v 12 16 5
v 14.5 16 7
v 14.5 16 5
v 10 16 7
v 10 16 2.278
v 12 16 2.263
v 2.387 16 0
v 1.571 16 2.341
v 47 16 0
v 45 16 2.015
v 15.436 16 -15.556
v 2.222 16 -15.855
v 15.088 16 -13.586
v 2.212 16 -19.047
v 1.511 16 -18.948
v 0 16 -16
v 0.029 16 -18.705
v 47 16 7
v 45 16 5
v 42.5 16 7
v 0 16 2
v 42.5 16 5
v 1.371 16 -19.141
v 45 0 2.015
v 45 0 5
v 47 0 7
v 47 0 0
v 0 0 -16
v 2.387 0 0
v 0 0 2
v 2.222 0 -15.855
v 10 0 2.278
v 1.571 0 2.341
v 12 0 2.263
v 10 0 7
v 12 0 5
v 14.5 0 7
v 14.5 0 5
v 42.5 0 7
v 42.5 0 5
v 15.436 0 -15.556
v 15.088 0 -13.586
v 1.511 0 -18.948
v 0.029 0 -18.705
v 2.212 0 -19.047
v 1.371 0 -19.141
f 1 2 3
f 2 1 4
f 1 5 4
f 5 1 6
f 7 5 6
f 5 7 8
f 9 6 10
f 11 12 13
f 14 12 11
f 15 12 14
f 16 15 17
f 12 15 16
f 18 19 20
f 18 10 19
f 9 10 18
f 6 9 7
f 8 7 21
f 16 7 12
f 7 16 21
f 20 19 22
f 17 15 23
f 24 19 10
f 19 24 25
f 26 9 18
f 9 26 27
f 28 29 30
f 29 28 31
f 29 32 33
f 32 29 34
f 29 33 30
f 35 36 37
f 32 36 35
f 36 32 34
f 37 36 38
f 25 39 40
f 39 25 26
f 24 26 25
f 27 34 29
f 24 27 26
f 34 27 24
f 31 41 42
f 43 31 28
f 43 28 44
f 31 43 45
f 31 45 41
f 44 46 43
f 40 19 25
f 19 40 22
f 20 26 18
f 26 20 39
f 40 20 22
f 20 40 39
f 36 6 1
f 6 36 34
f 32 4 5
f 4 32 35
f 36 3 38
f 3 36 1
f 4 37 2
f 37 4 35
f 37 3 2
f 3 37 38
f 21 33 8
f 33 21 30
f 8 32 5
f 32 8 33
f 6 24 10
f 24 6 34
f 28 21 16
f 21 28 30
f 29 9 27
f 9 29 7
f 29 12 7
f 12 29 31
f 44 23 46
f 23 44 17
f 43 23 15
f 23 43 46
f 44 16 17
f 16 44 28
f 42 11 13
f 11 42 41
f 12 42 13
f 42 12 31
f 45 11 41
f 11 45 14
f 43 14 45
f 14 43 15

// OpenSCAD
// Klemmträger
module long_arm() {
 hull() {
linear_extrude(height=2)
square([47, 16]);
     translate([1.2,16,1.2])
    rotate([90,0,0]) 
cylinder(r1=1.2, r2=1.2, h=16);
 }
}
module short_arm() {
hull() {
translate([1.2,16,1.2])
rotate([90,0,0]) 
cylinder(r1=1.2, r2=1.2, h=16);
rotate([0,90,0])
linear_extrude(height=2)
square([16, 16]);
rotate([90,0,0])
    translate([1,-18,-16])
cylinder(r1=1.2, r2=1.2, h=16);    
}
}

module claw() {
hull() {
rotate([90,0,0])
    translate([1,-18,-16])
cylinder(r1=1.2, r2=1.2, h=16);
rotate([0,180,0])
translate([-15,0,16])
linear_extrude(height=2)
square([15, 16]);
}
}

module rail() {
cube([16,4.5,2]);
rotate([90,0,0])
cube([16,4.5,2]);
}


long_arm();
short_arm();
rotate([0,-10,0])
translate([-2.5,0,0])
claw();
translate([47,0,5])
rotate([0,0,90])
rotate([-90,0,0])
rail();
translate([10,0,5])
rotate([0,-90,0])
rotate([0,0,90])
mirror([0,0,1])
rail();
